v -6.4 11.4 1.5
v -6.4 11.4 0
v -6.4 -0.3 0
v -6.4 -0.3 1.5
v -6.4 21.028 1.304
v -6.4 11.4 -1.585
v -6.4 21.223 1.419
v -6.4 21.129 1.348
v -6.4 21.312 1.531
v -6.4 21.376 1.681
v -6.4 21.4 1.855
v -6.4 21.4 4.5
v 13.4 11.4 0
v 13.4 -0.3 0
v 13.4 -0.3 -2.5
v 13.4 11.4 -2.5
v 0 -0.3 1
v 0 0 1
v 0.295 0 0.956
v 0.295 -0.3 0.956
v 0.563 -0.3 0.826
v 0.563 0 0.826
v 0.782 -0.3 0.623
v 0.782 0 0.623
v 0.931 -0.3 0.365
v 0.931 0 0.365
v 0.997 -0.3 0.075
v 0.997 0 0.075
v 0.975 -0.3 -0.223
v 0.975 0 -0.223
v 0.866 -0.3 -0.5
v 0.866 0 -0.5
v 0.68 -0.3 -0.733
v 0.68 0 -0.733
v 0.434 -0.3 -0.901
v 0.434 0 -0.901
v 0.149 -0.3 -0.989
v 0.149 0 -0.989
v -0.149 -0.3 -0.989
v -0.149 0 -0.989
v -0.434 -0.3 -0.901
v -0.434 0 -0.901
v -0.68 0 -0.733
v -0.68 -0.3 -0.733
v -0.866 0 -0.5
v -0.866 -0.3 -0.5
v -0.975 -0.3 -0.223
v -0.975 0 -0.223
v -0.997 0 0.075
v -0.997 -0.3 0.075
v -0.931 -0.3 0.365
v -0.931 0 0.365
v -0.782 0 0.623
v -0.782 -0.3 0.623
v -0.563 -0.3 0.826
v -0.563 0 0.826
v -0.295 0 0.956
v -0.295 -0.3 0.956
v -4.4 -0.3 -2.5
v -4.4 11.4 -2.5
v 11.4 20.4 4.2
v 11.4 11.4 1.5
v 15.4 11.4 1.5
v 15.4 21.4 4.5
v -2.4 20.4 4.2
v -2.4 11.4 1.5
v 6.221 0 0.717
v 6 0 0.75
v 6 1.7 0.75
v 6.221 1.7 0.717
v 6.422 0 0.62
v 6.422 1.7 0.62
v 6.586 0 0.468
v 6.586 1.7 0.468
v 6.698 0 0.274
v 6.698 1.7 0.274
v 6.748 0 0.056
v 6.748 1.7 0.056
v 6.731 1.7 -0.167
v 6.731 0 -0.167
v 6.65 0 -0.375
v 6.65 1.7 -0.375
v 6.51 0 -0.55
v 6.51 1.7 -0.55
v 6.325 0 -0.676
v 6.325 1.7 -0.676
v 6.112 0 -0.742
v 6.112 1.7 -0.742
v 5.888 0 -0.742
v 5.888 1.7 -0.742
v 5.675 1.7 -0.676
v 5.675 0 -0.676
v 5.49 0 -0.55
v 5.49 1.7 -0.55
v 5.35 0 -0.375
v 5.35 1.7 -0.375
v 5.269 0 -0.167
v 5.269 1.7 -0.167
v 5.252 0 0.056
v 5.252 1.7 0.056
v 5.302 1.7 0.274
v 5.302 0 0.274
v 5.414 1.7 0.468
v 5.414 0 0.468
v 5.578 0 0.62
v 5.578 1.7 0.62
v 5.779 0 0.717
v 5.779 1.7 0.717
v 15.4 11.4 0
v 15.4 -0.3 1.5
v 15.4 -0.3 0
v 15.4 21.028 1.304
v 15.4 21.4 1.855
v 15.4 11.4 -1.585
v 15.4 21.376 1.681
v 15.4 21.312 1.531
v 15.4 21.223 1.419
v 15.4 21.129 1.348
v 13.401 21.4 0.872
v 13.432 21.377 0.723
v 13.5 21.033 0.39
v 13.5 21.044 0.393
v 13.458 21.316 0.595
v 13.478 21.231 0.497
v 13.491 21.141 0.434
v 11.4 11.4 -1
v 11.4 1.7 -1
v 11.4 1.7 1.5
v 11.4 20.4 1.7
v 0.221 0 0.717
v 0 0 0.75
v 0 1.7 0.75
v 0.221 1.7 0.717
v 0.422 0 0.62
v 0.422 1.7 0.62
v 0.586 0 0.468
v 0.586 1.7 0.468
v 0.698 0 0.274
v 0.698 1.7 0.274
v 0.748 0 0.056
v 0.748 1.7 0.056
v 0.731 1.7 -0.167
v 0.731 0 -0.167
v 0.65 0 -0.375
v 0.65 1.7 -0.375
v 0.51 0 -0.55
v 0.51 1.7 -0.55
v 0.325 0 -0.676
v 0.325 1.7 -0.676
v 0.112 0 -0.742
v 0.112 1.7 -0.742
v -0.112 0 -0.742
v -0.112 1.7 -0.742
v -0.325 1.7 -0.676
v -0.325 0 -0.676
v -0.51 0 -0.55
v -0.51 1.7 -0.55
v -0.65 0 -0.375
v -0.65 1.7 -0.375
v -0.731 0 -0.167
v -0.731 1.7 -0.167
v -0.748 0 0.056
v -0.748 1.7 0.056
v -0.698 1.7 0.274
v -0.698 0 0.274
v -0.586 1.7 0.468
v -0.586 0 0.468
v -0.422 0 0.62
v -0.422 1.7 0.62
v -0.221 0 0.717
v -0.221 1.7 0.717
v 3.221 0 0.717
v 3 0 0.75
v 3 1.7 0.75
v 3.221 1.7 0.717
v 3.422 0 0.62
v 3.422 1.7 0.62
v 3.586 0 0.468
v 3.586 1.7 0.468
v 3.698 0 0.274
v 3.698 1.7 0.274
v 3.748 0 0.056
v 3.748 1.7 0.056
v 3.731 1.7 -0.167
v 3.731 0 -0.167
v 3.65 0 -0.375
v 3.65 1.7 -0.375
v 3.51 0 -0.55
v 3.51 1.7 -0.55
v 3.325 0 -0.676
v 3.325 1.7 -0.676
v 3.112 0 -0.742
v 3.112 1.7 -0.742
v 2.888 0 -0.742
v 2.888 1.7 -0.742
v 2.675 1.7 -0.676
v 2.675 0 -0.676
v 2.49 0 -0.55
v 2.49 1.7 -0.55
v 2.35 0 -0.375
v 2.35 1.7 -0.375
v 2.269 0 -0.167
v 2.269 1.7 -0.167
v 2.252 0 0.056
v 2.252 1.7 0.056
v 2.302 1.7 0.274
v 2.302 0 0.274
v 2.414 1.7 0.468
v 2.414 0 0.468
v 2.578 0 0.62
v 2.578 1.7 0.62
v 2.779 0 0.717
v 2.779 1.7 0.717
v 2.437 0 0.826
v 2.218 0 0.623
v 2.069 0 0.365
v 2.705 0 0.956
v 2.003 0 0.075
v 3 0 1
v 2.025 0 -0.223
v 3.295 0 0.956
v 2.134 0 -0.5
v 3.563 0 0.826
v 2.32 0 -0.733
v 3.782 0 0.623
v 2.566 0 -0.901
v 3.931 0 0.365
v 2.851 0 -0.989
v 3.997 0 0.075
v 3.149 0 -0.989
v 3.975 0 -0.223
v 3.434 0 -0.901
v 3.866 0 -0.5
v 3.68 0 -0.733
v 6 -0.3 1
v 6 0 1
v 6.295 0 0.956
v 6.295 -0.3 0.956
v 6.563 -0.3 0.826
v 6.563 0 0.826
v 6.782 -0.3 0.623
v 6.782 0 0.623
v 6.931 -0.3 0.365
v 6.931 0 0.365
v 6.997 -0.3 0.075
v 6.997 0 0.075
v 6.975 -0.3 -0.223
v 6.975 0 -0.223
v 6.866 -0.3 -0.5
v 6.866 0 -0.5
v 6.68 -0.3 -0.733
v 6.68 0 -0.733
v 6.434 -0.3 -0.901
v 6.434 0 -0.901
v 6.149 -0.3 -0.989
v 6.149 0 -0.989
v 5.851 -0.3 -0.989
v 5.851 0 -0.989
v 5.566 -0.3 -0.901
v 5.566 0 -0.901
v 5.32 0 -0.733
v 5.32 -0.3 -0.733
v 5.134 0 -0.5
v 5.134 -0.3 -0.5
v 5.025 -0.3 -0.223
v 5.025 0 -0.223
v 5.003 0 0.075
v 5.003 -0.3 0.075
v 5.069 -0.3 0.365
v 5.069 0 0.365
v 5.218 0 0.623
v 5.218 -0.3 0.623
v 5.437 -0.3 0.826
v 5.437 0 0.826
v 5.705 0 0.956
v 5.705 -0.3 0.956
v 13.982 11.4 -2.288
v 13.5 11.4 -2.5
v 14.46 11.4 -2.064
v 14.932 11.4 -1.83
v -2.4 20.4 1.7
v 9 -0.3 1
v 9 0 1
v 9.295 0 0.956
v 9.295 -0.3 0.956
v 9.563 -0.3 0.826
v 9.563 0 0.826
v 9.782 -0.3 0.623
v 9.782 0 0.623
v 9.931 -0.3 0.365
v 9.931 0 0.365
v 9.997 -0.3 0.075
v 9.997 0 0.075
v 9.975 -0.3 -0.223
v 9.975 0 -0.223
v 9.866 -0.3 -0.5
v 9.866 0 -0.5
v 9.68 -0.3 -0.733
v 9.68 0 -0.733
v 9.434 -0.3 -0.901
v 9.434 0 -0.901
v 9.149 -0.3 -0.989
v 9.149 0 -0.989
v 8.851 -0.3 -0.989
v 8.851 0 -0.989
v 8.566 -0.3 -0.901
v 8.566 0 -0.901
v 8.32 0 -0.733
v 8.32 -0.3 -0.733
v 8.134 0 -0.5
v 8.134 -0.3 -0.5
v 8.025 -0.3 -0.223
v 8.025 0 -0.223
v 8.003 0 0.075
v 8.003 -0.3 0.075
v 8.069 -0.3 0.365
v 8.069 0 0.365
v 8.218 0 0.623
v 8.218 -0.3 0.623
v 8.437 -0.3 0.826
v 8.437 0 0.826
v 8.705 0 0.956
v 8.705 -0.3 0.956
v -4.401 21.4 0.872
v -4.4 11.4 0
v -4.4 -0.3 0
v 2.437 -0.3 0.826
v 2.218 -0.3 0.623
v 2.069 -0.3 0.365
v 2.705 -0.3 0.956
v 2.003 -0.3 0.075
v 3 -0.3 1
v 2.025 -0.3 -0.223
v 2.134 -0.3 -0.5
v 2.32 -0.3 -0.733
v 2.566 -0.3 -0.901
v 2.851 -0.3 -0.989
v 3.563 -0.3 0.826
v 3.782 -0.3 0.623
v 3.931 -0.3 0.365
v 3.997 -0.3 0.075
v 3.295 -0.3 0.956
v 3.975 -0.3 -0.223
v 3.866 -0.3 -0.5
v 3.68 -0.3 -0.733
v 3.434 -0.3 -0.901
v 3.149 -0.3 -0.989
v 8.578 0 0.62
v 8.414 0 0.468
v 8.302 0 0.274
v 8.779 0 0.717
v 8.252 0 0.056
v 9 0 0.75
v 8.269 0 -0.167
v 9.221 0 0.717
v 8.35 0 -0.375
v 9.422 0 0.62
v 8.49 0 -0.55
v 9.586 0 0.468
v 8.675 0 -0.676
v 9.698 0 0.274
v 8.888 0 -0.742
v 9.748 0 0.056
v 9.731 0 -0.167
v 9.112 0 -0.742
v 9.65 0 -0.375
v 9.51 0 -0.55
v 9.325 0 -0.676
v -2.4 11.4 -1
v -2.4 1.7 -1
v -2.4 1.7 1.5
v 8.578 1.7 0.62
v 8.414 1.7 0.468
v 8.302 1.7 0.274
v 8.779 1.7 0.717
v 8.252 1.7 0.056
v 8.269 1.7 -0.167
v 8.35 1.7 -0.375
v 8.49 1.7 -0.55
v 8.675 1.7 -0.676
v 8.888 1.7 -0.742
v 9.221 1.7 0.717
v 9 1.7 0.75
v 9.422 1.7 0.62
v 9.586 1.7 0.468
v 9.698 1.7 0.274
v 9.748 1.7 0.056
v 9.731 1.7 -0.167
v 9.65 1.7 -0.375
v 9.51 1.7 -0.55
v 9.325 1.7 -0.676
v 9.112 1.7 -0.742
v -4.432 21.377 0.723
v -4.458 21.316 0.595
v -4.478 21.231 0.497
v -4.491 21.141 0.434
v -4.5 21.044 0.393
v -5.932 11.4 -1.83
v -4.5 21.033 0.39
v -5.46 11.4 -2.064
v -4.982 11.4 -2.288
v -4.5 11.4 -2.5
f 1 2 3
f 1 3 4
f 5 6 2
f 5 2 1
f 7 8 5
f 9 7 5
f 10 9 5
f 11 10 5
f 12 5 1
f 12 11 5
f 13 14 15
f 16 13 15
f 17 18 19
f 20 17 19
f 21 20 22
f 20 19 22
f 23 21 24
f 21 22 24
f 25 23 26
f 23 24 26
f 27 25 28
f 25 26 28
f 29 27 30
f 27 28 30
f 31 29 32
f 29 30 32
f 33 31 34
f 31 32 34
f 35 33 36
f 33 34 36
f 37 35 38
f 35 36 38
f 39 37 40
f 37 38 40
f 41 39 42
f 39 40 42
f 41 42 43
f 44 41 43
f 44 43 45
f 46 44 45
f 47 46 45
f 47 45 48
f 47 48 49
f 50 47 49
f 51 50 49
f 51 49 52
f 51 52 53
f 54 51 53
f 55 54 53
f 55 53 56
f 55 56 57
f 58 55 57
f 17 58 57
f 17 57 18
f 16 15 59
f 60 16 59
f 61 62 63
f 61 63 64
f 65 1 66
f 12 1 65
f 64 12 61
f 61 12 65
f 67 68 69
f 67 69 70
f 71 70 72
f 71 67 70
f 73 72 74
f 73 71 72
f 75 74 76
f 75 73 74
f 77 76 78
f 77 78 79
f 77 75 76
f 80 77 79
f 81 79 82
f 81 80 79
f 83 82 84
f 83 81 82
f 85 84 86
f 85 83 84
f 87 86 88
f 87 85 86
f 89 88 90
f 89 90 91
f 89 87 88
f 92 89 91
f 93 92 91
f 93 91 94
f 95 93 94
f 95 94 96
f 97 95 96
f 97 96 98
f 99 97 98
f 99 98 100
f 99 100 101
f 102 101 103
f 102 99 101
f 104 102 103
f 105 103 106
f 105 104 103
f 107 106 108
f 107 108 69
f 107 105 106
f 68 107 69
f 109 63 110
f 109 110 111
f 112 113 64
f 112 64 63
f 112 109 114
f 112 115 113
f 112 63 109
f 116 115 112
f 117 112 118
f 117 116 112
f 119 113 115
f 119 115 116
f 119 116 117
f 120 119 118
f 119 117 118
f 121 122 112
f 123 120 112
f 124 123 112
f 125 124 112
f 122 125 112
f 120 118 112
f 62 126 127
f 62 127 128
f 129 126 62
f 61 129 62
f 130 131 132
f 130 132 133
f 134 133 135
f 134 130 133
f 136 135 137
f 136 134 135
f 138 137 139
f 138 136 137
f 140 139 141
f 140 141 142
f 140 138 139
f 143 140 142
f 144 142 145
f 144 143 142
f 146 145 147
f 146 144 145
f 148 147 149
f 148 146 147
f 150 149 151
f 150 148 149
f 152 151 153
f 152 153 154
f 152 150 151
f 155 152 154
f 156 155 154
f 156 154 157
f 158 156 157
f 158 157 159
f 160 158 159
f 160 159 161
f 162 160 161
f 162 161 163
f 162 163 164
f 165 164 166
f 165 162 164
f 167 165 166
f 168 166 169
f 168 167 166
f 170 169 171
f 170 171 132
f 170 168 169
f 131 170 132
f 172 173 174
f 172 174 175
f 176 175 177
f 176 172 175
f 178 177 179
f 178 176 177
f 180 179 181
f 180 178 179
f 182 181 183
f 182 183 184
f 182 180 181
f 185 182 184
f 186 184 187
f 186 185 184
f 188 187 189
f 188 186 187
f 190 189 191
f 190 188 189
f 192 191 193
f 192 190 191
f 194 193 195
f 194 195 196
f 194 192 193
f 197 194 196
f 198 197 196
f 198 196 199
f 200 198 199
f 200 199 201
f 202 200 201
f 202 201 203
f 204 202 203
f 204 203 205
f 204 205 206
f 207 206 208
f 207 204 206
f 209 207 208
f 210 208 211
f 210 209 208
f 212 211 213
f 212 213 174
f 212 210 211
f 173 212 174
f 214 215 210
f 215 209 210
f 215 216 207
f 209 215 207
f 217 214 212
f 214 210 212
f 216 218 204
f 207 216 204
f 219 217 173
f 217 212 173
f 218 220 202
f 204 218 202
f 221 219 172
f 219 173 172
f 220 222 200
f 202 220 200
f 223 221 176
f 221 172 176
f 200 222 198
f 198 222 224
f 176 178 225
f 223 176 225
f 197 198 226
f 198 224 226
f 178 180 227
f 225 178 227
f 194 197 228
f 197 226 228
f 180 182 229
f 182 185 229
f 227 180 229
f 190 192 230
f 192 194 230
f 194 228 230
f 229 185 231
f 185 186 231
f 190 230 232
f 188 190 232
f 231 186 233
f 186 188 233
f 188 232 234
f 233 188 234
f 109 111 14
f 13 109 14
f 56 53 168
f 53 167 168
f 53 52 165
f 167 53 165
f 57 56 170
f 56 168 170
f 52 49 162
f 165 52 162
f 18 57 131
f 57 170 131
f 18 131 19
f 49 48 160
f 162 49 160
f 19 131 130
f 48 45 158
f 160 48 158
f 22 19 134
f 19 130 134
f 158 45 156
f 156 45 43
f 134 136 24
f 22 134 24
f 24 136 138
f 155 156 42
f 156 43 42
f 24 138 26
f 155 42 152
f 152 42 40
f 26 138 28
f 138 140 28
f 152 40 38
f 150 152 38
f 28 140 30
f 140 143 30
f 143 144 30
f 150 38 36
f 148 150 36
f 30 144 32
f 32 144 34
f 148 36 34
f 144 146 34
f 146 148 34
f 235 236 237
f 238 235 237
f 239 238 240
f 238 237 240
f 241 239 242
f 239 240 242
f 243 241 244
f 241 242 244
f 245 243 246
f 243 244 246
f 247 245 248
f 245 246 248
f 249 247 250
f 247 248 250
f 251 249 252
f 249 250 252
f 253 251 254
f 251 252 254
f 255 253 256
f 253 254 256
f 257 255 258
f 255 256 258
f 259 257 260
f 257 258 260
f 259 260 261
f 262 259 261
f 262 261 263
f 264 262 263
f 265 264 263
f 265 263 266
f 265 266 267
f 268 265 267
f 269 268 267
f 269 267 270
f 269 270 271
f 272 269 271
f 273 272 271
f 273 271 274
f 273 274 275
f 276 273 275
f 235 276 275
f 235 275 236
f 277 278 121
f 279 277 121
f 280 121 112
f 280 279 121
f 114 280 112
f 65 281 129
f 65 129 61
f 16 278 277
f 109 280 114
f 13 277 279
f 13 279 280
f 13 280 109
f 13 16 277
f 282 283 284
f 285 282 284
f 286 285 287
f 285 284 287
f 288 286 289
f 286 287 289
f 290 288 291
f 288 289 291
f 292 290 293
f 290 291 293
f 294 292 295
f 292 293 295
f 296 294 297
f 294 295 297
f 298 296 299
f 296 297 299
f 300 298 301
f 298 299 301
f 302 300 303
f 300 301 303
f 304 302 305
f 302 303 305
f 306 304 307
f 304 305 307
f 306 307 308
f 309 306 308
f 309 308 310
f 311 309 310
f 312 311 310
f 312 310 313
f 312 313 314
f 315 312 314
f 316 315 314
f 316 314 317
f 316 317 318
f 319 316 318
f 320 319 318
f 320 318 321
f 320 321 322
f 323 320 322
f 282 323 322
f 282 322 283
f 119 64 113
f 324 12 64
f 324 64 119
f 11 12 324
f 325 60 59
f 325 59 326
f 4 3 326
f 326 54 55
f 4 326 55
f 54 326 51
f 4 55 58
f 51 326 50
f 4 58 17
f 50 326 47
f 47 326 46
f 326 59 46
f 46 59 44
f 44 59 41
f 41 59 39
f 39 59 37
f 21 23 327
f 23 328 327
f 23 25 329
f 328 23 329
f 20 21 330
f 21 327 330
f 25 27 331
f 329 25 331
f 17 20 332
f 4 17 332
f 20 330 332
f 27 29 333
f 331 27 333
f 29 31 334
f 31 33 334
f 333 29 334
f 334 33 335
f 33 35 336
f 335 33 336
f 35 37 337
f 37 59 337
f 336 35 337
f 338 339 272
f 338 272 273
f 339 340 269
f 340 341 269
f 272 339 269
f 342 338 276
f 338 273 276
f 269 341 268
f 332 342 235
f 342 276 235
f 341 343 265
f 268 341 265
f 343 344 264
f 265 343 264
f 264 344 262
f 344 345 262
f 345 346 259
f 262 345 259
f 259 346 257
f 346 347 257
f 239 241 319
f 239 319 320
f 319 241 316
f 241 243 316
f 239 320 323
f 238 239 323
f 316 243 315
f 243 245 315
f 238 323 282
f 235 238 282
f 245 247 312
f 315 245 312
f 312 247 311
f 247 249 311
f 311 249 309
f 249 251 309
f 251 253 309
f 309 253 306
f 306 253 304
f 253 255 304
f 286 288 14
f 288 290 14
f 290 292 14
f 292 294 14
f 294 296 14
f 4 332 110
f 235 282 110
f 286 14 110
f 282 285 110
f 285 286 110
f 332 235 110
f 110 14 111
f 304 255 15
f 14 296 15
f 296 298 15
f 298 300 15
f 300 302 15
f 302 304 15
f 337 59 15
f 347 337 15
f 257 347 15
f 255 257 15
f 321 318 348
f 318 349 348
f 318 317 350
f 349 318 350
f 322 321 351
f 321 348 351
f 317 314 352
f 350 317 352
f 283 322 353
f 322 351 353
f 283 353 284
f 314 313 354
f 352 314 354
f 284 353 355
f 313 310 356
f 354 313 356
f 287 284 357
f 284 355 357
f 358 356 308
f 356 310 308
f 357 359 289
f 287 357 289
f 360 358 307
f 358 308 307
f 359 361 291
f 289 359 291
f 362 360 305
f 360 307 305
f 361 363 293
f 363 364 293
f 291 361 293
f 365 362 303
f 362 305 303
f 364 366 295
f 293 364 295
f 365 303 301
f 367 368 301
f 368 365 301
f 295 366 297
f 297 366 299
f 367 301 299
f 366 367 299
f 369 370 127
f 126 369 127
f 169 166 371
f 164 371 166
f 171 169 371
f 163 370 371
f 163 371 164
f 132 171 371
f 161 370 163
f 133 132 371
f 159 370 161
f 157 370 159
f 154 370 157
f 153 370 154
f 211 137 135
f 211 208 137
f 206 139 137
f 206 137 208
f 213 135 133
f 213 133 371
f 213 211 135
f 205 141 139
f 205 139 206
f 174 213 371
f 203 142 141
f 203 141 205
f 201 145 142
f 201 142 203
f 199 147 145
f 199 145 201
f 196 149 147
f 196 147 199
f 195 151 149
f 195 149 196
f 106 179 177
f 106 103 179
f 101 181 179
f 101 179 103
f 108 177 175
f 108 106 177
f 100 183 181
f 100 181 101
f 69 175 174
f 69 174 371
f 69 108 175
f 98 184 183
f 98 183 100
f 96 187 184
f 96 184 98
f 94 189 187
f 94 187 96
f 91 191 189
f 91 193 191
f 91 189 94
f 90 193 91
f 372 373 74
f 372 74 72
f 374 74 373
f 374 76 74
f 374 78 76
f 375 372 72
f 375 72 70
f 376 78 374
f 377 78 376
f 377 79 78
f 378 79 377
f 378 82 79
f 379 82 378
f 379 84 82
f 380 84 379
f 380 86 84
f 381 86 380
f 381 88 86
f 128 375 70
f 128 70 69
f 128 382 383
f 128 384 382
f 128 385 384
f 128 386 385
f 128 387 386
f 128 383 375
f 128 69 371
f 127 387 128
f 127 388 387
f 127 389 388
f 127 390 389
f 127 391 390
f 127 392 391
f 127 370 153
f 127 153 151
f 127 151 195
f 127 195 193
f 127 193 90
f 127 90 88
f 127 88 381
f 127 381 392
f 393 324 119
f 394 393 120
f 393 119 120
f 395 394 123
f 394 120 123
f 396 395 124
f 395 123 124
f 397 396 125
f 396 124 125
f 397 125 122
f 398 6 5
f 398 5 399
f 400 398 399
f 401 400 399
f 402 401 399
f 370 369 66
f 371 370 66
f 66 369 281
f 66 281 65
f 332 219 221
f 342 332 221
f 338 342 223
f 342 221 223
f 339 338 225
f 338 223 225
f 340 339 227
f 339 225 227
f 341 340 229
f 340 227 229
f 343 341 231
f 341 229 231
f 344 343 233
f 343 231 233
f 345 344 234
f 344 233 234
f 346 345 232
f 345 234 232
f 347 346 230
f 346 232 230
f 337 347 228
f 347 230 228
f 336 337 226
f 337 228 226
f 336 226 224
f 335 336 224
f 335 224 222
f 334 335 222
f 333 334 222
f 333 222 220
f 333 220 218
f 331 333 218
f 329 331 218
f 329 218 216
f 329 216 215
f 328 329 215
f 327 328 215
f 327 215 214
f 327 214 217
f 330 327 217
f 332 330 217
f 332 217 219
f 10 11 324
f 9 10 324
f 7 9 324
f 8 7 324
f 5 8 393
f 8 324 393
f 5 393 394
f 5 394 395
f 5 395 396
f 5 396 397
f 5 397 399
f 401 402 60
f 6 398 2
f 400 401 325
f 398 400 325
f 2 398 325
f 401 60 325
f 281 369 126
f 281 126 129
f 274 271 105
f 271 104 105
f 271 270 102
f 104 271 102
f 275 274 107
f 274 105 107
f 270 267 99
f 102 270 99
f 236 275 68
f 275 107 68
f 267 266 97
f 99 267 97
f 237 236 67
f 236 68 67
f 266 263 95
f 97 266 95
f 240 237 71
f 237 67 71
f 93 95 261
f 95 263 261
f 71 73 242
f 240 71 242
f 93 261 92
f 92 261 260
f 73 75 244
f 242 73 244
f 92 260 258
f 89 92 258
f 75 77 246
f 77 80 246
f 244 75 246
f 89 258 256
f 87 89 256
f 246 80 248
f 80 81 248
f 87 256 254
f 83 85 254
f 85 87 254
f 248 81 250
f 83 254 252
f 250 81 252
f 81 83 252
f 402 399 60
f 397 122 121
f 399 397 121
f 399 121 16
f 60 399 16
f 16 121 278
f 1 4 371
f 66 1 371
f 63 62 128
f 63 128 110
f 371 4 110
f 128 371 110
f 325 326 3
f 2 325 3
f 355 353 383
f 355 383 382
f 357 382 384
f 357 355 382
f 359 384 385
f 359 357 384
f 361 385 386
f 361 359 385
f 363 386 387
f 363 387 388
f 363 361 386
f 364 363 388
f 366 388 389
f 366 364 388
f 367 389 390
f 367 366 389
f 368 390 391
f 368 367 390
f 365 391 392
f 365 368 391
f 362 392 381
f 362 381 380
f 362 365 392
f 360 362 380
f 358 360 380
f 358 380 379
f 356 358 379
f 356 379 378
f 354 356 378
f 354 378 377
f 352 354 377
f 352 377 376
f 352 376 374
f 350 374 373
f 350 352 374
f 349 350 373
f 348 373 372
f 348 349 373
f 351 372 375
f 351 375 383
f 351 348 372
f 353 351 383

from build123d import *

# Parameters (mm, degrees)
SKETCH1_R                       = 0.75
BOSS_EXTRUDE1_DEPTH             = 1.7
SKETCH1_4_R                     = 1
BOSS_EXTRUDE2_DEPTH             = 0.3
BOSS_EXTRUDE3_DEPTH             = 11.4
BOSS_EXTRUDE4_REACH             = 24.984
CUT_EXTRUDE1_DEPTH              = 15.8
BOSS_EXTRUDE5_DEPTH             = 2
BOSS_EXTRUDE6_DEPTH             = 2
CUT_EXTRUDE4_DEPTH              = 10
CUT_EXTRUDE4_DEPTH_BACK         = 12
BOSS_EXTRUDE7_REACH             = 31.456
BOSS_EXTRUDE7_DIRECTION_2_REACH = 31.456
FILLET1_R                       = 0.5


with BuildPart() as part:
    # Sketch1 → Boss-Extrude1 (new body)
    with BuildSketch(Plane(origin=(0, 0, 0), x_dir=(1, 0, 0), z_dir=(0, 1, 0))):
        Polygon((13.4, 2.5), (-4.4, 2.5), (-4.4, 0), (-6.4, 0), (-6.4, -1.5), (15.4, -1.5), (15.4, 0), (13.4, 0), align=None)
        with Locations(Location((3, 0, 0), (0, 0, 270))):
            Circle(SKETCH1_R, mode=Mode.SUBTRACT)
        with Locations(Location((6, 0, 0), (0, 0, 270))):
            Circle(SKETCH1_R, mode=Mode.SUBTRACT)
        with Locations(Location((9, 0, 0), (0, 0, 270))):
            Circle(SKETCH1_R, mode=Mode.SUBTRACT)
        with Locations(Location((0, 0, 0), (0, 0, 270))):
            Circle(SKETCH1_R, mode=Mode.SUBTRACT)
    extrude(amount=BOSS_EXTRUDE1_DEPTH)

    # Sketch1<4> → Boss-Extrude2 (add)
    with BuildSketch(Plane(origin=(0, 0, 0), x_dir=(1, 0, 0), z_dir=(0, 1, 0))):
        Polygon((13.4, 2.5), (-4.4, 2.5), (-4.4, 0), (-6.4, 0), (-6.4, -1.5), (15.4, -1.5), (15.4, 0), (13.4, 0), align=None)
        with Locations(Location((0, 0, 0), (0, 0, 270))):
            Circle(SKETCH1_4_R, mode=Mode.SUBTRACT)
        with Locations(Location((3, 0, 0), (0, 0, 270))):
            Circle(SKETCH1_4_R, mode=Mode.SUBTRACT)
        with Locations(Location((6, 0, 0), (0, 0, 270))):
            Circle(SKETCH1_4_R, mode=Mode.SUBTRACT)
        with Locations(Location((9, 0, 0), (0, 0, 270))):
            Circle(SKETCH1_4_R, mode=Mode.SUBTRACT)
    extrude(amount=-BOSS_EXTRUDE2_DEPTH)

    # Sketch1<7> → Boss-Extrude3 (add)
    with BuildSketch(Plane(origin=(0, 0, 0), x_dir=(1, 0, 0), z_dir=(0, 1, 0))):
        Polygon((13.4, 1), (13.4, 2.5), (-4.4, 2.5), (-4.4, 1), (-2.4, 1), (0, 1), (3, 1), (6, 1), (9.000000004, 1), (11.4, 1), align=None)
        Polygon((-2.4, 1), (-4.4, 1), (-4.4, 0), (-6.4, 0), (-6.4, -1.5), (-2.4, -1.5), align=None)
        Polygon((13.4, 0), (13.4, 1), (11.4, 1), (11.4, -1.5), (15.4, -1.5), (15.4, 0), align=None)
    extrude(amount=BOSS_EXTRUDE3_DEPTH)

    # Boss-Extrude4: up to this face of the body (flat: up to its plane)
    boss_extrude4_end = Plane(part.part.faces().sort_by_distance((15.4, 5.55, 0.75))[0])
    # Sketch2 → Boss-Extrude4 (add, up to the picked face)
    with BuildSketch(Plane.ZY.offset(4.4), mode=Mode.PRIVATE) as boss_extrude4_sk1:
        Polygon((0.5, 21.4), (-2.5, 11.4), (1.5, 11.4), (4.2, 20.4), (1.7, 20.4), (2, 21.4), align=None)
    boss_extrude4_tool1 = split(extrude(boss_extrude4_sk1.sketch, amount=-BOSS_EXTRUDE4_REACH, mode=Mode.PRIVATE), bisect_by=boss_extrude4_end, keep=Keep.BOTH, mode=Mode.PRIVATE)
    add(boss_extrude4_tool1.solids().sort_by(Axis((-4.4, 16.1, 0.86), (1, 0, 0)))[0])

    # Sketch2<5> → Cut-Extrude1 (cut)
    with BuildSketch(Plane.ZY.offset(4.4)):
        Polygon((1.7, 20.4), (-1, 11.4), (1.5, 11.4), (4.2, 20.4), align=None)
    extrude(amount=-CUT_EXTRUDE1_DEPTH, mode=Mode.SUBTRACT)

    # Sketch2<6> → Boss-Extrude5 (add)
    with BuildSketch(Plane.ZY.offset(4.4)):
        Polygon((1.7, 20.4), (-1, 11.4), (1.5, 11.4), (4.2, 20.4), align=None)
    extrude(amount=-BOSS_EXTRUDE5_DEPTH)

    # Sketch2<7> → Boss-Extrude6 (add)
    with BuildSketch(Plane.ZY.offset(4.4)):
        Polygon((0.5, 21.4), (-2.5, 11.4), (1.5, 11.4), (4.2, 20.4), (1.7, 20.4), (2, 21.4), align=None)
    extrude(amount=BOSS_EXTRUDE6_DEPTH)

    # Sketch5 → Cut-Extrude4 (cut, two sides: drawn at the far end of the back side and taken through both)
    with BuildSketch(Plane(origin=(0, 19.770642202, 5.931192661), x_dir=(1, 0, 0), z_dir=(0, 0.9578262852211515, 0.2873478855663452)).offset(-CUT_EXTRUDE4_DEPTH_BACK)):
        with BuildLine():
            ThreePointArc((-6.6, 4.689132716), (-5.561967393, 5.205345242), (-4.5, 5.670331609))
            Line((-4.5, 5.670331609), (-17.5, 5.670331609))
            Line((-17.5, 5.670331609), (-17.5, -7.329668391))
            ThreePointArc((-17.5, -7.329668391), (-17.035013633, -6.267700999), (-16.518801108, -5.229668391))
            ThreePointArc((-16.518801108, -5.229668391), (-12.307736314, 0.478067922), (-6.6, 4.689132716))
        make_face()
        with BuildLine():
            ThreePointArc((25.518801108, -5.229668391), (26.035013633, -6.267700999), (26.5, -7.329668391))
            Line((26.5, -7.329668391), (26.5, 5.670331609))
            Line((26.5, 5.670331609), (13.5, 5.670331609))
            ThreePointArc((13.5, 5.670331609), (14.561967393, 5.205345242), (15.6, 4.689132716))
            ThreePointArc((15.6, 4.689132716), (21.307736314, 0.478067922), (25.518801108, -5.229668391))
        make_face()
    extrude(amount=CUT_EXTRUDE4_DEPTH + CUT_EXTRUDE4_DEPTH_BACK, mode=Mode.SUBTRACT)

    # Boss-Extrude7: up to this face of the body (flat: up to its plane)
    boss_extrude7_end = Plane(part.part.faces().sort_by_distance((-6.4, 12.005993792, 1.097626434))[0])
    # Sketch2<8> → Boss-Extrude7 (add, up to the picked face)
    with BuildSketch(Plane.ZY.offset(4.4), mode=Mode.PRIVATE) as boss_extrude7_sk1:
        Polygon((4.5, 21.4), (2, 21.4), (1.7, 20.4), (4.2, 20.4), align=None)
    boss_extrude7_tool1 = split(extrude(boss_extrude7_sk1.sketch, amount=BOSS_EXTRUDE7_REACH, mode=Mode.PRIVATE), bisect_by=boss_extrude7_end, keep=Keep.BOTH, mode=Mode.PRIVATE)
    add(boss_extrude7_tool1.solids().sort_by(Axis((-4.4, 20.9, 3.1), (-1, 0, 0)))[0])

    # Boss-Extrude7 direction 2: up to this face of the body (flat: up to its plane)
    boss_extrude7_direction_2_end = Plane(part.part.faces().sort_by_distance((15.4, 12.005993792, 1.097626434))[0])
    # Sketch2<8> → Boss-Extrude7 direction 2 (add, up to the picked face)
    with BuildSketch(Plane.ZY.offset(4.4), mode=Mode.PRIVATE) as boss_extrude7_direction_2_sk1:
        Polygon((4.5, 21.4), (2, 21.4), (1.7, 20.4), (4.2, 20.4), align=None)
    boss_extrude7_direction_2_tool1 = split(extrude(boss_extrude7_direction_2_sk1.sketch, amount=-BOSS_EXTRUDE7_DIRECTION_2_REACH, mode=Mode.PRIVATE), bisect_by=boss_extrude7_direction_2_end, keep=Keep.BOTH, mode=Mode.PRIVATE)
    add(boss_extrude7_direction_2_tool1.solids().sort_by(Axis((-4.4, 20.9, 3.1), (1, 0, 0)))[0])

    # Fillet1
    fillet1_edges = [part.edges().sort_by_distance(p)[0] for p in [
        (4.5, 21.4, 0.5),
        (14.46035786, 21.4, 0.936198075),
        (-5.46035786, 21.4, 0.936198075),
    ]]
    fillet(fillet1_edges, radius=FILLET1_R)


solid = part.part
